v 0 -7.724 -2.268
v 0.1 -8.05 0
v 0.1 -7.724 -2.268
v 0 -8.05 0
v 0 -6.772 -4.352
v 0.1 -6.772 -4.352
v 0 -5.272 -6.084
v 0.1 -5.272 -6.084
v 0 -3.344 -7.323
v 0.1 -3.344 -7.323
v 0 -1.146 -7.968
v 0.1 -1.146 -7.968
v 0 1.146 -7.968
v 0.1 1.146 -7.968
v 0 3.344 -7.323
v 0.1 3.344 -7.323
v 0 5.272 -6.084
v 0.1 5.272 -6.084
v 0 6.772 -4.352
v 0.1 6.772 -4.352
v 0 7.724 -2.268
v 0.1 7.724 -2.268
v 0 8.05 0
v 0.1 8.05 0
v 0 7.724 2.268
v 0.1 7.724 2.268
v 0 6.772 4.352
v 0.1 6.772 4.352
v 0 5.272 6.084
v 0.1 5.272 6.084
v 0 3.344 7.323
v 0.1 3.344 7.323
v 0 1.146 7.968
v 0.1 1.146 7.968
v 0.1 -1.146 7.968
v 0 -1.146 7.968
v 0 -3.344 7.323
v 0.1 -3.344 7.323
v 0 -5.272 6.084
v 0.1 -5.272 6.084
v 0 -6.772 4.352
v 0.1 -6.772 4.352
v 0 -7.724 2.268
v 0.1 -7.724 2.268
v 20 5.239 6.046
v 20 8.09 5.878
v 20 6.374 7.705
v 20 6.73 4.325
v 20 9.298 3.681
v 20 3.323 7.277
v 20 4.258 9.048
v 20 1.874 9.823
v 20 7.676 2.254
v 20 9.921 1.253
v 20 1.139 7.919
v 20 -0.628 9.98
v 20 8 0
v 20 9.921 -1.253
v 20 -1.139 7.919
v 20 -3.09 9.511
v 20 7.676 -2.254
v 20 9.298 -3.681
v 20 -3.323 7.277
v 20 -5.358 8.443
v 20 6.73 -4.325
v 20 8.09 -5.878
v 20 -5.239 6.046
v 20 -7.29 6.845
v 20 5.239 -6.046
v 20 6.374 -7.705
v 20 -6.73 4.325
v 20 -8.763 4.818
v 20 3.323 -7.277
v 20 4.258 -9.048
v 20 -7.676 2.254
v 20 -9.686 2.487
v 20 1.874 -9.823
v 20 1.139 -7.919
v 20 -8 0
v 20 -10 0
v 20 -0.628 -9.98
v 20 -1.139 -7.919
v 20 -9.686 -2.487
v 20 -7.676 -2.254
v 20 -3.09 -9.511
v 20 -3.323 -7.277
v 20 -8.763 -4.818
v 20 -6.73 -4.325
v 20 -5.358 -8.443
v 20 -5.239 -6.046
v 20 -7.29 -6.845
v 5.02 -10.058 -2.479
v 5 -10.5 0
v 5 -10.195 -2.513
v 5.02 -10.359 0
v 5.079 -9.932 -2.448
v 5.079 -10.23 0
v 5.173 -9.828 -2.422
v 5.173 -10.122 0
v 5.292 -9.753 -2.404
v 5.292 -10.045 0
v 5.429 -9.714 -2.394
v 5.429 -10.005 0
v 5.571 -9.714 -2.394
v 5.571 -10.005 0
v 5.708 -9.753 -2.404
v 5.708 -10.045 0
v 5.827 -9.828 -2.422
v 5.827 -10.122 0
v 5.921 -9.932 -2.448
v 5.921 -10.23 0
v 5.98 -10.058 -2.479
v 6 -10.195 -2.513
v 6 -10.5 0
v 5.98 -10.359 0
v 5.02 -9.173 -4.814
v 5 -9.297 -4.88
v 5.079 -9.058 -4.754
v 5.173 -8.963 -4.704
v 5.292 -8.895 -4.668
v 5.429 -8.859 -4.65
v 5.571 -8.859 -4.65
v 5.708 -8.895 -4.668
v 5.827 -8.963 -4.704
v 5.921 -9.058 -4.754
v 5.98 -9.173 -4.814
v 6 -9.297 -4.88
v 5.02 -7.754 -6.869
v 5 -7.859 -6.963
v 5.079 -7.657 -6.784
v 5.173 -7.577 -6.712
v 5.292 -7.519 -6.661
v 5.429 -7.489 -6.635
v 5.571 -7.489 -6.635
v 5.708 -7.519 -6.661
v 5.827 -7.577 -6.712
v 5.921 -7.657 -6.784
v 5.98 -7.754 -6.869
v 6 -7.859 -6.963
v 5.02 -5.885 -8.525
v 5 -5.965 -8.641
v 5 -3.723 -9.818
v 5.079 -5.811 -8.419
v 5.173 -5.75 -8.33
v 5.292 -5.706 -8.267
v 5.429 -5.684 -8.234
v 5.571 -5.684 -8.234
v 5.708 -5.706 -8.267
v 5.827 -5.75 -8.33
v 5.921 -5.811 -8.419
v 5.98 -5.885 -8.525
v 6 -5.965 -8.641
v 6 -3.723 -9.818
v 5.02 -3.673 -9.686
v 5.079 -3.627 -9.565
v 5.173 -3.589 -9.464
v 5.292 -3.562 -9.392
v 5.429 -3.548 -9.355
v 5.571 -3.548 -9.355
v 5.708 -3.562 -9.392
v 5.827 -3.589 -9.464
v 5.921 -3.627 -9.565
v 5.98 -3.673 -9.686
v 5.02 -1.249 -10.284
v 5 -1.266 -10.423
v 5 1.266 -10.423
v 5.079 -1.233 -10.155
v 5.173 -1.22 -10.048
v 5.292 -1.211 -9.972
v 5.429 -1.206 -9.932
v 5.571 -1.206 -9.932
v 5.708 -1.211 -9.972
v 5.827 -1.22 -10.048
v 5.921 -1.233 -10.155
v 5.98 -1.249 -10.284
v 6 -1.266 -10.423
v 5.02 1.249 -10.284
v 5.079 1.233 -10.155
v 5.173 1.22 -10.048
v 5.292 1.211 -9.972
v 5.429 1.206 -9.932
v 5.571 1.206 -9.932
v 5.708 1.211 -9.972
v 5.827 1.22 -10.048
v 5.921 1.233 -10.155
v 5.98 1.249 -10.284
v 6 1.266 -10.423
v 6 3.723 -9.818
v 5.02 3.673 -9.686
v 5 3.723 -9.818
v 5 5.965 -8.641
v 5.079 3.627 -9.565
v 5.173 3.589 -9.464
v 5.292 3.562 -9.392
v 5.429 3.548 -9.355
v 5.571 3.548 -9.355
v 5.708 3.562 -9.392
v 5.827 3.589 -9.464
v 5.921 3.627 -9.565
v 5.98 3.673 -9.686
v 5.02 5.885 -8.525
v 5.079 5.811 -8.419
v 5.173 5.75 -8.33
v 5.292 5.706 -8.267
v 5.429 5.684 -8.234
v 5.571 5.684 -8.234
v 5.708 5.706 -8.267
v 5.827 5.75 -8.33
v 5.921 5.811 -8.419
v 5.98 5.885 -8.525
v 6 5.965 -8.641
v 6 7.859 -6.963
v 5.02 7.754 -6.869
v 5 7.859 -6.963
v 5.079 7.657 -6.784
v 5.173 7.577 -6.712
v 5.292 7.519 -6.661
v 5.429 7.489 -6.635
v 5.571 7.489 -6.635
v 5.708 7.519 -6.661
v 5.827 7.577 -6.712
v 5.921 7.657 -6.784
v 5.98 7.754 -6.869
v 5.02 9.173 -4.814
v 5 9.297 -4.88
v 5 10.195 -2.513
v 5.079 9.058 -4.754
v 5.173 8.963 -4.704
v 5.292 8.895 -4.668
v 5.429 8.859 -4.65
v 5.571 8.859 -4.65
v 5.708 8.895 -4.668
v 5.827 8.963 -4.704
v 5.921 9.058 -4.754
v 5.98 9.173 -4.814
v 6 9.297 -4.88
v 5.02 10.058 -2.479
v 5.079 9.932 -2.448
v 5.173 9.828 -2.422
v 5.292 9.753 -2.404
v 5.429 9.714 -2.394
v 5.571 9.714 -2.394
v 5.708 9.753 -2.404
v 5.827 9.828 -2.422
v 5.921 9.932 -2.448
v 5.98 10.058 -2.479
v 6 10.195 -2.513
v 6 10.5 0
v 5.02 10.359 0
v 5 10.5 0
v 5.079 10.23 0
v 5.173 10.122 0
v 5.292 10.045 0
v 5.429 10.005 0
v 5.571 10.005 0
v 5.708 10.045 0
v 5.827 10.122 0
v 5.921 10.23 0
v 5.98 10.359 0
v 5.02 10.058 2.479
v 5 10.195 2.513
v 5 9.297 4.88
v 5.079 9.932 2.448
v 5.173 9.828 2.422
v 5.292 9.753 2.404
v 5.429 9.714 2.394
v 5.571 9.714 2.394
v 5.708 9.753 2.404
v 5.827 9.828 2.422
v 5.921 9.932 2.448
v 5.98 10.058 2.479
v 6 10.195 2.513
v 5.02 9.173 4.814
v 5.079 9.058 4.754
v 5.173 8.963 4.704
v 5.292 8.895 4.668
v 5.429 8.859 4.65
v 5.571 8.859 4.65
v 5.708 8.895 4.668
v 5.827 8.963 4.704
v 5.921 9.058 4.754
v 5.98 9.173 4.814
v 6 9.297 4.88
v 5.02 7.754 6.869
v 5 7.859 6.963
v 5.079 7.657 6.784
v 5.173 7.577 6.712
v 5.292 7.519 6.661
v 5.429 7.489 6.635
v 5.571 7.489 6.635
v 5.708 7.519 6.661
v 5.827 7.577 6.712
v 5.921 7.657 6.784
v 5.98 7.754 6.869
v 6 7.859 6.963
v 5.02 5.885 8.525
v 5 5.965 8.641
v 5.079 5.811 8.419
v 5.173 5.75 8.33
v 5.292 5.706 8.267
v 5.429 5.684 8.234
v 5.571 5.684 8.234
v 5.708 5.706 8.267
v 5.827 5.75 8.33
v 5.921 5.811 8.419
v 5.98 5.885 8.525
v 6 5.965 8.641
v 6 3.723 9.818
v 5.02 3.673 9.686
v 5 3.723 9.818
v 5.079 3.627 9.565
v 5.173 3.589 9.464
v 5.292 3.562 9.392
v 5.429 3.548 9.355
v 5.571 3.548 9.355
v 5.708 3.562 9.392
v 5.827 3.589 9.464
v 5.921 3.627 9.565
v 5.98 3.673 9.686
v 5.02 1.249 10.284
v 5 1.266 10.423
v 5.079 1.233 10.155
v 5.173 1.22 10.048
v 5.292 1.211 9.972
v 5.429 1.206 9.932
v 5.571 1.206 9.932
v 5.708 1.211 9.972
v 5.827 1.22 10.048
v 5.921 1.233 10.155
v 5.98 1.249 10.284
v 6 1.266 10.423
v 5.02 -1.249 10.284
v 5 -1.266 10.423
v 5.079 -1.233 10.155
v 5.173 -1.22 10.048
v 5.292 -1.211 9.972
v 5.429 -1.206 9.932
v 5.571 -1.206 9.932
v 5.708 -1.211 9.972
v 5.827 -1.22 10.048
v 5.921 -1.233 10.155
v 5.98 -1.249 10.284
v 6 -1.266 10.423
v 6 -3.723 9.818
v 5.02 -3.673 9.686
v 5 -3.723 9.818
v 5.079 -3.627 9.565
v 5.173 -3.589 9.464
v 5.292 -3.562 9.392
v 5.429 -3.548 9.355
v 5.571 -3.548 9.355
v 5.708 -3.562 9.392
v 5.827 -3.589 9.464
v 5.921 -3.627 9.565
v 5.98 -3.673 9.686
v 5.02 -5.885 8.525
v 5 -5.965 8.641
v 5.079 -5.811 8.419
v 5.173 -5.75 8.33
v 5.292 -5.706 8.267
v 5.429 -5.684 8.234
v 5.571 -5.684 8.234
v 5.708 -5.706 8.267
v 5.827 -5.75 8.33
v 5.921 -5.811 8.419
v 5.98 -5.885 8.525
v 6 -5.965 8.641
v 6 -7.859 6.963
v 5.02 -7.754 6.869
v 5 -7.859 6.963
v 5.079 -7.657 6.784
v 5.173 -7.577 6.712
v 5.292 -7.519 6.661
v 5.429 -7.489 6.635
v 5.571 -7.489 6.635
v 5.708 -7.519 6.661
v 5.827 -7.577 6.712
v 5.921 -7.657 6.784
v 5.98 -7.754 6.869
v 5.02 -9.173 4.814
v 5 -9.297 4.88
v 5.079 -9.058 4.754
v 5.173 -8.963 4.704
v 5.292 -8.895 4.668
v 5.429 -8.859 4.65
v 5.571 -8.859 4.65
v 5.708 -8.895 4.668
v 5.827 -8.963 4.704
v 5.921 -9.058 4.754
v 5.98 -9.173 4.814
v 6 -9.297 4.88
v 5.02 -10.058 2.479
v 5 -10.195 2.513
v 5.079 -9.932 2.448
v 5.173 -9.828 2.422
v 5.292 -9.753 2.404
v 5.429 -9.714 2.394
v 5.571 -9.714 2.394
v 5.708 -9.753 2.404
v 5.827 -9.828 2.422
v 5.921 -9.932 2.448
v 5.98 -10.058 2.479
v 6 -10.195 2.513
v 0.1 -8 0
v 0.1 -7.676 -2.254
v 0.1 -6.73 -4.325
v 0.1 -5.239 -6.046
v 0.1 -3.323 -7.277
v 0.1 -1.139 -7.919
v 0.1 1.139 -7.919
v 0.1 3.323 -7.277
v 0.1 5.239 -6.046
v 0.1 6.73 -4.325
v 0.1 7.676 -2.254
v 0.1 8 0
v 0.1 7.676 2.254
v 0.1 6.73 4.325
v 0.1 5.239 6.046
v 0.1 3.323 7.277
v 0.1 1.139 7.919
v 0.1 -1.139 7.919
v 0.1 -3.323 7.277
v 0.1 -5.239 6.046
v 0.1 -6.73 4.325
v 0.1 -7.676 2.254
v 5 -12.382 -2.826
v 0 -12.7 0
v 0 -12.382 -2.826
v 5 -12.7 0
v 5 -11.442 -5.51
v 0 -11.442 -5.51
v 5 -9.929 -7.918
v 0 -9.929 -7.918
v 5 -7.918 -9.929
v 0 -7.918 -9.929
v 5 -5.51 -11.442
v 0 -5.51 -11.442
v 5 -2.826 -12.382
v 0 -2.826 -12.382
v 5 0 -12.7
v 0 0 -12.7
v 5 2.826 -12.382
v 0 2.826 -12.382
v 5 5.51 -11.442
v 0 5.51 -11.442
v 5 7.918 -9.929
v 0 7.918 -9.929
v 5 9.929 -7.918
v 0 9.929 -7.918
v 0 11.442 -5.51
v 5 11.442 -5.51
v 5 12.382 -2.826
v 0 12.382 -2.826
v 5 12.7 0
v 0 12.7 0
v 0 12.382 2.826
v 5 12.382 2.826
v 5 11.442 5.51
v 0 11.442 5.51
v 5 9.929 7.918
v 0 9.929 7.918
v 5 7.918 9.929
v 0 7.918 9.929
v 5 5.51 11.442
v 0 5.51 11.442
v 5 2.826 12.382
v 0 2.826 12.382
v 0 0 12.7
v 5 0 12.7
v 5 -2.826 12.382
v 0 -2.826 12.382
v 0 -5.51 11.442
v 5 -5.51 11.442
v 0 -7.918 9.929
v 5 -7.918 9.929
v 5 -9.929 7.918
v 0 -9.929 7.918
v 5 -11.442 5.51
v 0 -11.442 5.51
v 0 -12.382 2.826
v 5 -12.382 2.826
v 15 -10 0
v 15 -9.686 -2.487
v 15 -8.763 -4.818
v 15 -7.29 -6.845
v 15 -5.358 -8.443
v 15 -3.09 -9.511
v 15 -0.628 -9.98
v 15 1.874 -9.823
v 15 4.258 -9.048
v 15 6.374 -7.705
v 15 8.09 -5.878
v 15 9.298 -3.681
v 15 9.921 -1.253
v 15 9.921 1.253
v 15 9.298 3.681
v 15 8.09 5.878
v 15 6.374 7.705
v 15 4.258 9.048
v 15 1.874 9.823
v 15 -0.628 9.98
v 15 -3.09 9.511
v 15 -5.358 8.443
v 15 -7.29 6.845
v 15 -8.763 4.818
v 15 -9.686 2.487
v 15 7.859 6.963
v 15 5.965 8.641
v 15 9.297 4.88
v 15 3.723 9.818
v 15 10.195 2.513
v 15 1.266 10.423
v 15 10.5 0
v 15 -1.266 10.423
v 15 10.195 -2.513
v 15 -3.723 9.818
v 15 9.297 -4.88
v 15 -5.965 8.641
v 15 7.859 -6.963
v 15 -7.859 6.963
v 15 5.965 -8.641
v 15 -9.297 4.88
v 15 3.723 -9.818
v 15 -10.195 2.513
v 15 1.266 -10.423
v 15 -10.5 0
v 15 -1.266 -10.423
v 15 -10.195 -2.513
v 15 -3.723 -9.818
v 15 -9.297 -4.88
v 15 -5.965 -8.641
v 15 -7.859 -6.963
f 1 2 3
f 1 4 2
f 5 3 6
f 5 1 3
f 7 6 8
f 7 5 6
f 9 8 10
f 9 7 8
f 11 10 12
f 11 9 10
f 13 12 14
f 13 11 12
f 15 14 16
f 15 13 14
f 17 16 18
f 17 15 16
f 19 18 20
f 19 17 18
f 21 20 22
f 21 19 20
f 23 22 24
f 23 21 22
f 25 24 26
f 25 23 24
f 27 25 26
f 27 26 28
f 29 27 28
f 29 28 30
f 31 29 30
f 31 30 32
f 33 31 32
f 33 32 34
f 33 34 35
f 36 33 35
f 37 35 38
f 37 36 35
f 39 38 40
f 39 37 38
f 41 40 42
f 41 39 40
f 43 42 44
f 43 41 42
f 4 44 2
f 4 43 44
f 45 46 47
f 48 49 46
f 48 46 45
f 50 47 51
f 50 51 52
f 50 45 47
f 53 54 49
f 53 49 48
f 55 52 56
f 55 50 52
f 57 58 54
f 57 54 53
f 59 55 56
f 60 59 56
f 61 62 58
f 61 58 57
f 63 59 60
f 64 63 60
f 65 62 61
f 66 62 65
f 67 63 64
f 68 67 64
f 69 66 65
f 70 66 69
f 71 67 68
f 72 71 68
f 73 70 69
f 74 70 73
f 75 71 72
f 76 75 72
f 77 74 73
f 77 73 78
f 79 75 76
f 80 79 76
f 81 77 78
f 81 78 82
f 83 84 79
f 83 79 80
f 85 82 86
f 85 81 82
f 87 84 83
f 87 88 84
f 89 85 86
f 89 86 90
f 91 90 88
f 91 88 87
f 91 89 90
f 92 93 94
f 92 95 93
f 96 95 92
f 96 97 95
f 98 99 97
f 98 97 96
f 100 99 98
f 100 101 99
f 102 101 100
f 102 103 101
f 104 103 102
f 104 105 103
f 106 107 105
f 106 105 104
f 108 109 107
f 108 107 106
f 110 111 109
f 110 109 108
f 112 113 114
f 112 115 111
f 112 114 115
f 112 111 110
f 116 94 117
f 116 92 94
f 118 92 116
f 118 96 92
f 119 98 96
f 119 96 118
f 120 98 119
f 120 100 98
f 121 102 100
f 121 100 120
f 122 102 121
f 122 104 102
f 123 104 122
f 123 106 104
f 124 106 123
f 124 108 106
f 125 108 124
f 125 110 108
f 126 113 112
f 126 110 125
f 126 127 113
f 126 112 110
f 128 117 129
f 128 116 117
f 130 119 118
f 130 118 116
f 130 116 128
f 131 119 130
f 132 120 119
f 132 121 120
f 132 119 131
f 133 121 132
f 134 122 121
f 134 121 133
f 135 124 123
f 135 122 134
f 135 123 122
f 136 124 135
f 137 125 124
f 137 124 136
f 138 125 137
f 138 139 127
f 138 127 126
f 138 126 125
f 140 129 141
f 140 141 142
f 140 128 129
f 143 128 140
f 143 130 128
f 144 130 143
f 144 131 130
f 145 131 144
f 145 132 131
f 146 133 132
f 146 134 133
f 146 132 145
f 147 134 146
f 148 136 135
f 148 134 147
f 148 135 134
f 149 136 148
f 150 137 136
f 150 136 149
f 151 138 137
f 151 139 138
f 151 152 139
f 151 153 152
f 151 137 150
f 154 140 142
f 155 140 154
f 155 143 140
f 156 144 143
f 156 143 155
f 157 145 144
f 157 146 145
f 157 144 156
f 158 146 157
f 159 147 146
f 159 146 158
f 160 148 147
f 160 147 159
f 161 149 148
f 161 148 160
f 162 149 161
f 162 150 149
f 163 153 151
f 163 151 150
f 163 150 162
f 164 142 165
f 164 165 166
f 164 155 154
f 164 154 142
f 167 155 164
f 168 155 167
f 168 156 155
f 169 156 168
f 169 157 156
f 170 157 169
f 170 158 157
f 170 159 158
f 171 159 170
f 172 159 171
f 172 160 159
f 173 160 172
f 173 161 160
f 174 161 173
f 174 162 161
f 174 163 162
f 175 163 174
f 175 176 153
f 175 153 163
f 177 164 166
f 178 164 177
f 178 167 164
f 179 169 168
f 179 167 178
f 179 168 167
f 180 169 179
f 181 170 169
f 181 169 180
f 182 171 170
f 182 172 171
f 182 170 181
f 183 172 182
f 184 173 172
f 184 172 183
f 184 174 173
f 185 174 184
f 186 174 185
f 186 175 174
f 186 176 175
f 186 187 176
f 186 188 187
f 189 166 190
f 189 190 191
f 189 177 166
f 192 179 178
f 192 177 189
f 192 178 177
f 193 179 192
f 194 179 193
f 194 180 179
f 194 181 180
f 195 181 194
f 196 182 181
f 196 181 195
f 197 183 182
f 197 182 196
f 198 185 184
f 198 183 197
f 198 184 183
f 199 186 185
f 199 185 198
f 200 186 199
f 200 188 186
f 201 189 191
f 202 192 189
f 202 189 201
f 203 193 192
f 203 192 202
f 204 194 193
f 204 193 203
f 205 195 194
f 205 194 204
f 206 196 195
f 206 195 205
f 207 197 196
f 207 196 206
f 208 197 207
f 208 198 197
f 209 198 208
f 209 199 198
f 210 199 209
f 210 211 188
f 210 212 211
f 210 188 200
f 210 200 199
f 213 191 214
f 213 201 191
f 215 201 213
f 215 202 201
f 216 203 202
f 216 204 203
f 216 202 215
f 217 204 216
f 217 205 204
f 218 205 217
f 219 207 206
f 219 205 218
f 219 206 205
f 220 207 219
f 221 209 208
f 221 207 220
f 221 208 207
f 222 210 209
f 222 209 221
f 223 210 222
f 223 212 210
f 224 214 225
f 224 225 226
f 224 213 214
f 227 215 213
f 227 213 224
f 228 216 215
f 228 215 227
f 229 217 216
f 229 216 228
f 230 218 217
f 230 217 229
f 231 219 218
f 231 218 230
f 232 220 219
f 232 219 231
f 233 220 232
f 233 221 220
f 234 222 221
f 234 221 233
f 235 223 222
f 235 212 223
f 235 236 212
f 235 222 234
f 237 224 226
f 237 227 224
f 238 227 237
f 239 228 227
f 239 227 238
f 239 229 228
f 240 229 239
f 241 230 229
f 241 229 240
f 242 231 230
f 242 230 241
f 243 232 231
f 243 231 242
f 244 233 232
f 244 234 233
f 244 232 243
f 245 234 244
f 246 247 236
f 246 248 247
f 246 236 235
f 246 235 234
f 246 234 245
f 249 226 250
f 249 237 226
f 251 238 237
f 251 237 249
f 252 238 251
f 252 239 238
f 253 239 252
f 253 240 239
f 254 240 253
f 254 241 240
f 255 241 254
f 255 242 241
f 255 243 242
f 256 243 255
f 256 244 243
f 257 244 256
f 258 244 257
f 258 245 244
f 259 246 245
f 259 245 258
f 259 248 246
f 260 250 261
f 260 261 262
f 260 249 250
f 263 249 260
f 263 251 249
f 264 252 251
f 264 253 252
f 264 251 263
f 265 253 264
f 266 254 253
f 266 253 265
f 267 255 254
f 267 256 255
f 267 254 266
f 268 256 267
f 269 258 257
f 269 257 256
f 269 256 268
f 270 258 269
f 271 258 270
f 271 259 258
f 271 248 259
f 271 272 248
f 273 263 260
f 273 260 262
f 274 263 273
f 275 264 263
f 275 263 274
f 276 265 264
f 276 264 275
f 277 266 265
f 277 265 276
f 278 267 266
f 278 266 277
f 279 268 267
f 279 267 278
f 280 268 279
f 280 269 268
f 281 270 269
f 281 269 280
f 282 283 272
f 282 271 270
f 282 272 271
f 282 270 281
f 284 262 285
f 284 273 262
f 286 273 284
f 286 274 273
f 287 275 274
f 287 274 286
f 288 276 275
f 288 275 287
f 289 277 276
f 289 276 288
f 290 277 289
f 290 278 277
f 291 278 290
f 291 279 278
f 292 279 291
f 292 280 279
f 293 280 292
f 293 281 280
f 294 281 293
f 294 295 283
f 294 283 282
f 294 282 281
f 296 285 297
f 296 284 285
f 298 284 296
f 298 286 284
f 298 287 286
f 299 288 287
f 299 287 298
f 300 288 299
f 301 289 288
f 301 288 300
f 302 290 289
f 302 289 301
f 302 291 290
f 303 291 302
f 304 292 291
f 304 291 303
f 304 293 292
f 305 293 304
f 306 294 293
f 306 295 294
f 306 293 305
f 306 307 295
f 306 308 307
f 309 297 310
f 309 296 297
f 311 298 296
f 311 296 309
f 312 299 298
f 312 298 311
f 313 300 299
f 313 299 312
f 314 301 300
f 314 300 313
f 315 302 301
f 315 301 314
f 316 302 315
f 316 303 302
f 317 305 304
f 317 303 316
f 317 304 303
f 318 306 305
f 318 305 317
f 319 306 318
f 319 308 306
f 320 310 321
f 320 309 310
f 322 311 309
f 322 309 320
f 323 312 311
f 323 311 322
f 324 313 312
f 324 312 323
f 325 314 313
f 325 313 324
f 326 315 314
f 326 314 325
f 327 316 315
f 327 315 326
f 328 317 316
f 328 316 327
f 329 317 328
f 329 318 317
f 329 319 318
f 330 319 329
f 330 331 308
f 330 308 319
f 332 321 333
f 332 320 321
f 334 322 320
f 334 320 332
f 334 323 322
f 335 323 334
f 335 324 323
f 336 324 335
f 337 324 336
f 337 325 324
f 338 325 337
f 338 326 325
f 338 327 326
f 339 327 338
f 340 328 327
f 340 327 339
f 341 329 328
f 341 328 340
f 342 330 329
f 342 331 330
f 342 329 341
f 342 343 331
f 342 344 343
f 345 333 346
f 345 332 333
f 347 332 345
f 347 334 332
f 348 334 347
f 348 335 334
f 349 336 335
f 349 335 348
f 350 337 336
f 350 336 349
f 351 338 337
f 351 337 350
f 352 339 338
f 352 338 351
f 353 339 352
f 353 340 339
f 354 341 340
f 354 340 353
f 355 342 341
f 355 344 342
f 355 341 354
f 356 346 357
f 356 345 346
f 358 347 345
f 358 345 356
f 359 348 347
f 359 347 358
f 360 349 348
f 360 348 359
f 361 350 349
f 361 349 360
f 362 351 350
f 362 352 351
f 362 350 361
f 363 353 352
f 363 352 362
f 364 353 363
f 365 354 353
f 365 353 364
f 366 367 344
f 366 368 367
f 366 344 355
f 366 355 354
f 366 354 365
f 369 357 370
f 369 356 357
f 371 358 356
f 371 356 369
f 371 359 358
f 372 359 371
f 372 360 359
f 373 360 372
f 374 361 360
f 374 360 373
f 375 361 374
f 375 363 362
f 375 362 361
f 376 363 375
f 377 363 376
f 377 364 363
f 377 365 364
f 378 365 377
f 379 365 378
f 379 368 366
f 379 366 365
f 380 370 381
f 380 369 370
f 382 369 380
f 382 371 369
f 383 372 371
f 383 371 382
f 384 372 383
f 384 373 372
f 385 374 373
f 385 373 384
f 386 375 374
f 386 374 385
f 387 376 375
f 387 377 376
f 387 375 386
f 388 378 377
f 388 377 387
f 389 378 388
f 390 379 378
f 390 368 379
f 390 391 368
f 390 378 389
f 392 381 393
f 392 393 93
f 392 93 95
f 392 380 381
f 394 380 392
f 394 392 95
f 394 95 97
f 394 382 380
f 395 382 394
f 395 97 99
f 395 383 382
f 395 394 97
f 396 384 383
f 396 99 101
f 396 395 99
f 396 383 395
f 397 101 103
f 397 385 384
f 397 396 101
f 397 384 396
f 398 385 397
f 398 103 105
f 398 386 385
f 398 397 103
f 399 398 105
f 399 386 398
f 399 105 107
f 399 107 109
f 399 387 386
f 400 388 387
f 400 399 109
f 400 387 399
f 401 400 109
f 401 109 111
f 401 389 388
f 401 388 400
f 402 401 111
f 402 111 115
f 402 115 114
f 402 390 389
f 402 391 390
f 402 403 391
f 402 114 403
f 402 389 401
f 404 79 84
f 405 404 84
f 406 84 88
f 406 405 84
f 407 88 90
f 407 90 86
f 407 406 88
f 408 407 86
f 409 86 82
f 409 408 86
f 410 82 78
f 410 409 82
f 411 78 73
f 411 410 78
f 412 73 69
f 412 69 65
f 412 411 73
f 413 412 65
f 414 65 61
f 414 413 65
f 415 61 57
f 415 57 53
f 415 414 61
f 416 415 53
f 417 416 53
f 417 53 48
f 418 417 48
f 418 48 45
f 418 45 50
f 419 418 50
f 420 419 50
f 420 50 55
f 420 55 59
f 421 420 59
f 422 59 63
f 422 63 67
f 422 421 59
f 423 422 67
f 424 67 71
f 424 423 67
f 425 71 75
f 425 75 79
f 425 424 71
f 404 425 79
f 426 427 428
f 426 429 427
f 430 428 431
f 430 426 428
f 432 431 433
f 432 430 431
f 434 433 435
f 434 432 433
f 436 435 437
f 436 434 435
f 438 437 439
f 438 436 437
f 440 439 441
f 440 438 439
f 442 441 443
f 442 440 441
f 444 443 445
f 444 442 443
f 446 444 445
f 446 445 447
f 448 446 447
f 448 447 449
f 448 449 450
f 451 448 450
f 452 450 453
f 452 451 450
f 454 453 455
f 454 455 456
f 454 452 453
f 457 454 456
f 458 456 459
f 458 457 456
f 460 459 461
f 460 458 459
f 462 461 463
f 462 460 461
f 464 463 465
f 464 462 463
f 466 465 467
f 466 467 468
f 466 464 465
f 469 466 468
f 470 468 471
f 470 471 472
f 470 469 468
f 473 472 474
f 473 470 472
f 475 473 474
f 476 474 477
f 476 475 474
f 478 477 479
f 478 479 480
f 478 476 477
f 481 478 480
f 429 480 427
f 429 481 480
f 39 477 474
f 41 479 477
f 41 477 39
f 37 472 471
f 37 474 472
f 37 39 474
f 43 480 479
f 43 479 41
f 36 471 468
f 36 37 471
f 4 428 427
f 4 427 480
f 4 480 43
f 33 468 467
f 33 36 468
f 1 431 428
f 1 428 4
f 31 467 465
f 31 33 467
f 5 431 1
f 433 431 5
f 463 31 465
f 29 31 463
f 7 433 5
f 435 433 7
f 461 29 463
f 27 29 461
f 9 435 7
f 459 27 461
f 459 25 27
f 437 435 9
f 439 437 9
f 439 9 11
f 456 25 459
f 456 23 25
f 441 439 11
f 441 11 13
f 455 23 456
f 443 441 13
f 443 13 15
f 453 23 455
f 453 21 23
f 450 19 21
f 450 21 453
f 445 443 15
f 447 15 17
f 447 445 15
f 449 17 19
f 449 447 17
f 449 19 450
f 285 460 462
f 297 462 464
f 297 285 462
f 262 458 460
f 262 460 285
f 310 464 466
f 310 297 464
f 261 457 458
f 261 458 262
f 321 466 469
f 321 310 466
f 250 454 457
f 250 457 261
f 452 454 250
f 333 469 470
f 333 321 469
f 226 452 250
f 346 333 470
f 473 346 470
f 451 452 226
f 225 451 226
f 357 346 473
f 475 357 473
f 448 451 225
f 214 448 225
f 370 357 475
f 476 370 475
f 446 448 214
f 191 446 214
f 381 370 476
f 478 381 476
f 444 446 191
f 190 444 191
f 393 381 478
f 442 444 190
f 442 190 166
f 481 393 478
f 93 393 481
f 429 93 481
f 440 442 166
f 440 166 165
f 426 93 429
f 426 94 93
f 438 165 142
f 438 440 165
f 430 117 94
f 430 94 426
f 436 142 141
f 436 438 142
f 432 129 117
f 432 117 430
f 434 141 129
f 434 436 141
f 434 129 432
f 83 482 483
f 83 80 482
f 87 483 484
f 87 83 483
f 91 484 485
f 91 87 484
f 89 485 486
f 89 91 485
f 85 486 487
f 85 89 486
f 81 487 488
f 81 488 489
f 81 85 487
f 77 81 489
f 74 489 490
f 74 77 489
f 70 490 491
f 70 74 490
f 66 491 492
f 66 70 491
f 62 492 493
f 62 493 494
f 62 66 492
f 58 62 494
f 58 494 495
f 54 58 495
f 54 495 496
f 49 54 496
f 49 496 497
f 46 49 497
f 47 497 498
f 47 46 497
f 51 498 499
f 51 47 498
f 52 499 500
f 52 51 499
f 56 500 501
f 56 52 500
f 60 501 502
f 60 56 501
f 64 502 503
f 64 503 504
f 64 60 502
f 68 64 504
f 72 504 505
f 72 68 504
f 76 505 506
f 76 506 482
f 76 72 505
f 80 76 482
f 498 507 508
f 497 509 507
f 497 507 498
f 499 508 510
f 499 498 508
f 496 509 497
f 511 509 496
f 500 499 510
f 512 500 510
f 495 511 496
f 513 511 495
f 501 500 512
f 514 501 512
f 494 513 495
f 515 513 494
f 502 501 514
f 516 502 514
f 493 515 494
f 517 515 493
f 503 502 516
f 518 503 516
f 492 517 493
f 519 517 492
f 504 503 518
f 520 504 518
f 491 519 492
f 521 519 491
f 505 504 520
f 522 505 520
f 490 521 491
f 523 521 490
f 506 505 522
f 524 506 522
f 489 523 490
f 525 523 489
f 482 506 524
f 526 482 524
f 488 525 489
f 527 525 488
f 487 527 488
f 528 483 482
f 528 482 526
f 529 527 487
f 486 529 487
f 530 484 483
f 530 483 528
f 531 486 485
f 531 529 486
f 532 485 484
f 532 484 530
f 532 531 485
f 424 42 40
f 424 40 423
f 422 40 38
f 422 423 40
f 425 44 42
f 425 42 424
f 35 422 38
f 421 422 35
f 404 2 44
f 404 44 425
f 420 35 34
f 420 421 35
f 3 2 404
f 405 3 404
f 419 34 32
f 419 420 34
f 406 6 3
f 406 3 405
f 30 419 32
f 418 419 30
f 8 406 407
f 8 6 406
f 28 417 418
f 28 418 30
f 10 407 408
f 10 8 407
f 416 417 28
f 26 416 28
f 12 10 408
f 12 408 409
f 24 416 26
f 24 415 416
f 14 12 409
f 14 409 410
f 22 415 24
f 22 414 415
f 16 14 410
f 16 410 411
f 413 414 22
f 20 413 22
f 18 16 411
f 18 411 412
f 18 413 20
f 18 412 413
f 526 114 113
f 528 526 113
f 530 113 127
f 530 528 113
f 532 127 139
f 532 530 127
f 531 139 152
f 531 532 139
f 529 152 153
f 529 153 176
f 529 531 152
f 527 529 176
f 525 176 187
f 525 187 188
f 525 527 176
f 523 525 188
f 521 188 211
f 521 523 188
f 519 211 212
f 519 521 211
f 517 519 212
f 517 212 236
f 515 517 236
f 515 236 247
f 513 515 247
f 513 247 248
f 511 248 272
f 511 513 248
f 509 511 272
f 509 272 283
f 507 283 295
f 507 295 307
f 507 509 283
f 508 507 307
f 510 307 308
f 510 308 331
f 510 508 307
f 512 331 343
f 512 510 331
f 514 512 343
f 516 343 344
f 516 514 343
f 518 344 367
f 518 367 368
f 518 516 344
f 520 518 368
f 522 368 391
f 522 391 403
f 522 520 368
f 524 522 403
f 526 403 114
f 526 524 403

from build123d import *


with BuildPart() as part:
    # Esboço1 → Revolução1 (revolve)
    with BuildSketch(Plane.XY, mode=Mode.PRIVATE) as revolu_o1_sk:
        with BuildLine():
            Line((0, 8.05), (0, 12.7))
            Line((0, 12.7), (5, 12.7))
            Line((5, 12.7), (5, 10.5))
            ThreePointArc((5, 10.5), (5.5, 10), (6, 10.5))
            Line((6, 10.5), (15, 10.5))
            Line((15, 10.5), (15, 10))
            Line((15, 10), (20, 10))
            Line((20, 10), (20, 8))
            Line((20, 8), (0.1, 8))
            Line((0.1, 8), (0.1, 8.05))
            Line((0.1, 8.05), (0, 8.05))
        make_face()
    revolve(revolu_o1_sk.sketch.rotate(Axis((-138.925343643, 0, 0), (1, 0, 0)), 180), axis=Axis((-138.925343643, 0, 0), (1, 0, 0)))  # turned: the seam where the file's is


solid = part.part
